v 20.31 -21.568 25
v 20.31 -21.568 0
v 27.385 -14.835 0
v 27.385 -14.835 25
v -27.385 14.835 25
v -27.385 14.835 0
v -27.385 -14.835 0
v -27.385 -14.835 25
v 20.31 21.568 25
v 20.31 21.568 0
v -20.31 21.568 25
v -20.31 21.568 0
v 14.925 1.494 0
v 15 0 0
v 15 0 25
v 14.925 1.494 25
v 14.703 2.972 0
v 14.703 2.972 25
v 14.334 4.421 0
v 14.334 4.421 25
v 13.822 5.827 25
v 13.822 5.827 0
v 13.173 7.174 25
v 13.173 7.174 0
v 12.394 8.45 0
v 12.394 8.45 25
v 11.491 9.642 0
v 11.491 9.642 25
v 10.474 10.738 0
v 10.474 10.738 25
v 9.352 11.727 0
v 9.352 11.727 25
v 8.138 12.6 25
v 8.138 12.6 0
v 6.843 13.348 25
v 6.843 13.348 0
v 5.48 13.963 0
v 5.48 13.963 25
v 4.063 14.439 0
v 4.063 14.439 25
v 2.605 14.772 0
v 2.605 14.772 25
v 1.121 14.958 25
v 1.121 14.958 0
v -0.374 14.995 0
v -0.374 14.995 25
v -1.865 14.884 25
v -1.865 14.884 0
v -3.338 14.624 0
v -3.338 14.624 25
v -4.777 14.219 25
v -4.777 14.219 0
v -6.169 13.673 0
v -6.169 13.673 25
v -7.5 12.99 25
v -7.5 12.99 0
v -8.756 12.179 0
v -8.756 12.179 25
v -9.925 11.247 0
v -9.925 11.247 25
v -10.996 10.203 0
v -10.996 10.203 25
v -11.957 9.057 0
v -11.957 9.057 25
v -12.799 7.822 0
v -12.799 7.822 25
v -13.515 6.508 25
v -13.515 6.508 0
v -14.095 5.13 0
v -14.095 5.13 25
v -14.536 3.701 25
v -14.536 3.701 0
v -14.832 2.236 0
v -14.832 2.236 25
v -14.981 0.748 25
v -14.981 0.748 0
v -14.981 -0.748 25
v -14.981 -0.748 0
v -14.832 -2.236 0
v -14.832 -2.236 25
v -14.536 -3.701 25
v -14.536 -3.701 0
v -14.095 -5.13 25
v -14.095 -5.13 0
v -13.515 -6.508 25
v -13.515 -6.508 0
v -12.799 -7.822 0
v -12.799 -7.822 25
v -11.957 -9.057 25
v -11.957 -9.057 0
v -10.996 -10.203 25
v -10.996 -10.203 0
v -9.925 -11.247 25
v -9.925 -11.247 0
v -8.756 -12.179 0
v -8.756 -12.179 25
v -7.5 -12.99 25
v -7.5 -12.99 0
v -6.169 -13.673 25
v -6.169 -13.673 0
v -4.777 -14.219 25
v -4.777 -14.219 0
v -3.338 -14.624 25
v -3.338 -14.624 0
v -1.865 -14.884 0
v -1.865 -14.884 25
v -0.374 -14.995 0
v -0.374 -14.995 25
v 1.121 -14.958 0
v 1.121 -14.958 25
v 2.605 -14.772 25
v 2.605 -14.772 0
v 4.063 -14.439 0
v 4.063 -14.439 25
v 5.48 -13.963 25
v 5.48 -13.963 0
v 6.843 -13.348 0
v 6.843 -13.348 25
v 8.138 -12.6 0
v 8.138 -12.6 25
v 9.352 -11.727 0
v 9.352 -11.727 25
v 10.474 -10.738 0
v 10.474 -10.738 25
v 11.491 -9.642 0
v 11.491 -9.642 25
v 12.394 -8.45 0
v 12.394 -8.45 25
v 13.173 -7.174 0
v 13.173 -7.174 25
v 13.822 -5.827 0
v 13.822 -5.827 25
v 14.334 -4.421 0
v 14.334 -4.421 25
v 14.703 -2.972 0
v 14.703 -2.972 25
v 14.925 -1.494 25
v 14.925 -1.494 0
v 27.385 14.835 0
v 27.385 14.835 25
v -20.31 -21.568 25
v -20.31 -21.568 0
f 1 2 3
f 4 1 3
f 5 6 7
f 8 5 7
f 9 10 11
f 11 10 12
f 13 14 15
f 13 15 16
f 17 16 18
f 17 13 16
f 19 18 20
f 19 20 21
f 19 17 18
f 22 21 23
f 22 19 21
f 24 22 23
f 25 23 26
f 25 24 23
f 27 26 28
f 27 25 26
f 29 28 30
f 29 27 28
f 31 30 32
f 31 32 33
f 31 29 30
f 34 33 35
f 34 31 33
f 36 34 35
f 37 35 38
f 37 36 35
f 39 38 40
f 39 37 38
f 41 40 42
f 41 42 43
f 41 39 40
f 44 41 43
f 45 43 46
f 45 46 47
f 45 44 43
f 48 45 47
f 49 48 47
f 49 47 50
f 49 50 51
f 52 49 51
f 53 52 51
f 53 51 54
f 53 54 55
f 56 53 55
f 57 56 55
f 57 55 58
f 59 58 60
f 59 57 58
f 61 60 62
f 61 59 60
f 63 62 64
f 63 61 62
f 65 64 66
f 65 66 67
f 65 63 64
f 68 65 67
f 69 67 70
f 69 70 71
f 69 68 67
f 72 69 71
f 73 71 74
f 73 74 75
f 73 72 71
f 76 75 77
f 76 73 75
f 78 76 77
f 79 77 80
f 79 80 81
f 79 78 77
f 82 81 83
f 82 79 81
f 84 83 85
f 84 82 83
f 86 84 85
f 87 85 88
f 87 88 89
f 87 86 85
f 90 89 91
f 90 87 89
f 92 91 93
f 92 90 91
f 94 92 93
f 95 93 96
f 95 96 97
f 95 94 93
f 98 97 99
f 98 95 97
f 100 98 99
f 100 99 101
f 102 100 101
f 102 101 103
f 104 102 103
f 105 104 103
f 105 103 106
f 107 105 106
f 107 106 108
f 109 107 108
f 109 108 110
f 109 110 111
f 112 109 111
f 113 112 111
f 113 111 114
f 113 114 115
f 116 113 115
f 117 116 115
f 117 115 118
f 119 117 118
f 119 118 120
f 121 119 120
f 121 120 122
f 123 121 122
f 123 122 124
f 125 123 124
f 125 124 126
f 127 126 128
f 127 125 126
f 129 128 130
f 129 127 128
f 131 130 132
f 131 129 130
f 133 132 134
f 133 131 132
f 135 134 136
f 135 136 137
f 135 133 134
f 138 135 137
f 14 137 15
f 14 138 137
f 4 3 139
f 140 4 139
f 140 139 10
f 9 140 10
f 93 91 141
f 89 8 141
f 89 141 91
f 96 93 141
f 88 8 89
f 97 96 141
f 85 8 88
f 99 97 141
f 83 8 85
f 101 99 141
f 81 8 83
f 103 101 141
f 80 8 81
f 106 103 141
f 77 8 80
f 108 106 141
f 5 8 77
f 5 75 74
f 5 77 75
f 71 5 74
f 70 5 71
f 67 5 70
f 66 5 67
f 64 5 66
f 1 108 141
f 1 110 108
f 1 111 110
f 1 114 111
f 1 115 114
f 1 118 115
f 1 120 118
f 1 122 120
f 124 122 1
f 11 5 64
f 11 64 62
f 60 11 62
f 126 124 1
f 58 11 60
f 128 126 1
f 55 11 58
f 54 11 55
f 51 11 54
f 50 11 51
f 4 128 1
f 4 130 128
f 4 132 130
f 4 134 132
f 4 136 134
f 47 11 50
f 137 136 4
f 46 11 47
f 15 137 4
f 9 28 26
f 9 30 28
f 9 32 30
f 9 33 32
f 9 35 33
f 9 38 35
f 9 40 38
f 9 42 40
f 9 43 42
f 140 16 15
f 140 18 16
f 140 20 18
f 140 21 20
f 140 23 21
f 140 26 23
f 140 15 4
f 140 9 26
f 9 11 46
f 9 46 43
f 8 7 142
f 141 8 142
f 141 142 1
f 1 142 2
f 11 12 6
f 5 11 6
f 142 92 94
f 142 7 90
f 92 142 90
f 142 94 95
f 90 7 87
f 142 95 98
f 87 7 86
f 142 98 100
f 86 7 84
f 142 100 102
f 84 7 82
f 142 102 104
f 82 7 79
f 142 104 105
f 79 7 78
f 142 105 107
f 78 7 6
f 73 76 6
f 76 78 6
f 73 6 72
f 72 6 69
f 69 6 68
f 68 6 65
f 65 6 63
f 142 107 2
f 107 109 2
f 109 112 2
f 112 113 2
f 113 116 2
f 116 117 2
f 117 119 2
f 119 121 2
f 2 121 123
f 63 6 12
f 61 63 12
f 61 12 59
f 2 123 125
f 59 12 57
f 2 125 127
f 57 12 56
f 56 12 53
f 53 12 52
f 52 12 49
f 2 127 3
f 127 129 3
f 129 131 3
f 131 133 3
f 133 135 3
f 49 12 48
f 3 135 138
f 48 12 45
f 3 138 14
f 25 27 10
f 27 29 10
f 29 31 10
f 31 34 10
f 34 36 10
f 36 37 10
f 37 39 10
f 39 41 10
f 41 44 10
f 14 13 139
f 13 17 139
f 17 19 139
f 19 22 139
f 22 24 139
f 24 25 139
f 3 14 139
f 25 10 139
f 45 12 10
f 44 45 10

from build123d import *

# Parameters (mm, degrees)
F0_R     = 15
F1_DEPTH = 25


with BuildPart() as f1:
    # F0 (on Top) → F1 (new body)
    with BuildSketch(Plane.XY):
        Polygon((-20.309781, -21.567568), (20.309781, -21.567568), (27.385138, -14.834567), (27.385138, 14.834567), (20.309781, 21.567568), (-20.309781, 21.567568), (-27.385138, 14.834567), (-27.385138, -14.834567), align=None)
        Circle(F0_R, mode=Mode.SUBTRACT)
    extrude(amount=F1_DEPTH)


solid = f1.part
